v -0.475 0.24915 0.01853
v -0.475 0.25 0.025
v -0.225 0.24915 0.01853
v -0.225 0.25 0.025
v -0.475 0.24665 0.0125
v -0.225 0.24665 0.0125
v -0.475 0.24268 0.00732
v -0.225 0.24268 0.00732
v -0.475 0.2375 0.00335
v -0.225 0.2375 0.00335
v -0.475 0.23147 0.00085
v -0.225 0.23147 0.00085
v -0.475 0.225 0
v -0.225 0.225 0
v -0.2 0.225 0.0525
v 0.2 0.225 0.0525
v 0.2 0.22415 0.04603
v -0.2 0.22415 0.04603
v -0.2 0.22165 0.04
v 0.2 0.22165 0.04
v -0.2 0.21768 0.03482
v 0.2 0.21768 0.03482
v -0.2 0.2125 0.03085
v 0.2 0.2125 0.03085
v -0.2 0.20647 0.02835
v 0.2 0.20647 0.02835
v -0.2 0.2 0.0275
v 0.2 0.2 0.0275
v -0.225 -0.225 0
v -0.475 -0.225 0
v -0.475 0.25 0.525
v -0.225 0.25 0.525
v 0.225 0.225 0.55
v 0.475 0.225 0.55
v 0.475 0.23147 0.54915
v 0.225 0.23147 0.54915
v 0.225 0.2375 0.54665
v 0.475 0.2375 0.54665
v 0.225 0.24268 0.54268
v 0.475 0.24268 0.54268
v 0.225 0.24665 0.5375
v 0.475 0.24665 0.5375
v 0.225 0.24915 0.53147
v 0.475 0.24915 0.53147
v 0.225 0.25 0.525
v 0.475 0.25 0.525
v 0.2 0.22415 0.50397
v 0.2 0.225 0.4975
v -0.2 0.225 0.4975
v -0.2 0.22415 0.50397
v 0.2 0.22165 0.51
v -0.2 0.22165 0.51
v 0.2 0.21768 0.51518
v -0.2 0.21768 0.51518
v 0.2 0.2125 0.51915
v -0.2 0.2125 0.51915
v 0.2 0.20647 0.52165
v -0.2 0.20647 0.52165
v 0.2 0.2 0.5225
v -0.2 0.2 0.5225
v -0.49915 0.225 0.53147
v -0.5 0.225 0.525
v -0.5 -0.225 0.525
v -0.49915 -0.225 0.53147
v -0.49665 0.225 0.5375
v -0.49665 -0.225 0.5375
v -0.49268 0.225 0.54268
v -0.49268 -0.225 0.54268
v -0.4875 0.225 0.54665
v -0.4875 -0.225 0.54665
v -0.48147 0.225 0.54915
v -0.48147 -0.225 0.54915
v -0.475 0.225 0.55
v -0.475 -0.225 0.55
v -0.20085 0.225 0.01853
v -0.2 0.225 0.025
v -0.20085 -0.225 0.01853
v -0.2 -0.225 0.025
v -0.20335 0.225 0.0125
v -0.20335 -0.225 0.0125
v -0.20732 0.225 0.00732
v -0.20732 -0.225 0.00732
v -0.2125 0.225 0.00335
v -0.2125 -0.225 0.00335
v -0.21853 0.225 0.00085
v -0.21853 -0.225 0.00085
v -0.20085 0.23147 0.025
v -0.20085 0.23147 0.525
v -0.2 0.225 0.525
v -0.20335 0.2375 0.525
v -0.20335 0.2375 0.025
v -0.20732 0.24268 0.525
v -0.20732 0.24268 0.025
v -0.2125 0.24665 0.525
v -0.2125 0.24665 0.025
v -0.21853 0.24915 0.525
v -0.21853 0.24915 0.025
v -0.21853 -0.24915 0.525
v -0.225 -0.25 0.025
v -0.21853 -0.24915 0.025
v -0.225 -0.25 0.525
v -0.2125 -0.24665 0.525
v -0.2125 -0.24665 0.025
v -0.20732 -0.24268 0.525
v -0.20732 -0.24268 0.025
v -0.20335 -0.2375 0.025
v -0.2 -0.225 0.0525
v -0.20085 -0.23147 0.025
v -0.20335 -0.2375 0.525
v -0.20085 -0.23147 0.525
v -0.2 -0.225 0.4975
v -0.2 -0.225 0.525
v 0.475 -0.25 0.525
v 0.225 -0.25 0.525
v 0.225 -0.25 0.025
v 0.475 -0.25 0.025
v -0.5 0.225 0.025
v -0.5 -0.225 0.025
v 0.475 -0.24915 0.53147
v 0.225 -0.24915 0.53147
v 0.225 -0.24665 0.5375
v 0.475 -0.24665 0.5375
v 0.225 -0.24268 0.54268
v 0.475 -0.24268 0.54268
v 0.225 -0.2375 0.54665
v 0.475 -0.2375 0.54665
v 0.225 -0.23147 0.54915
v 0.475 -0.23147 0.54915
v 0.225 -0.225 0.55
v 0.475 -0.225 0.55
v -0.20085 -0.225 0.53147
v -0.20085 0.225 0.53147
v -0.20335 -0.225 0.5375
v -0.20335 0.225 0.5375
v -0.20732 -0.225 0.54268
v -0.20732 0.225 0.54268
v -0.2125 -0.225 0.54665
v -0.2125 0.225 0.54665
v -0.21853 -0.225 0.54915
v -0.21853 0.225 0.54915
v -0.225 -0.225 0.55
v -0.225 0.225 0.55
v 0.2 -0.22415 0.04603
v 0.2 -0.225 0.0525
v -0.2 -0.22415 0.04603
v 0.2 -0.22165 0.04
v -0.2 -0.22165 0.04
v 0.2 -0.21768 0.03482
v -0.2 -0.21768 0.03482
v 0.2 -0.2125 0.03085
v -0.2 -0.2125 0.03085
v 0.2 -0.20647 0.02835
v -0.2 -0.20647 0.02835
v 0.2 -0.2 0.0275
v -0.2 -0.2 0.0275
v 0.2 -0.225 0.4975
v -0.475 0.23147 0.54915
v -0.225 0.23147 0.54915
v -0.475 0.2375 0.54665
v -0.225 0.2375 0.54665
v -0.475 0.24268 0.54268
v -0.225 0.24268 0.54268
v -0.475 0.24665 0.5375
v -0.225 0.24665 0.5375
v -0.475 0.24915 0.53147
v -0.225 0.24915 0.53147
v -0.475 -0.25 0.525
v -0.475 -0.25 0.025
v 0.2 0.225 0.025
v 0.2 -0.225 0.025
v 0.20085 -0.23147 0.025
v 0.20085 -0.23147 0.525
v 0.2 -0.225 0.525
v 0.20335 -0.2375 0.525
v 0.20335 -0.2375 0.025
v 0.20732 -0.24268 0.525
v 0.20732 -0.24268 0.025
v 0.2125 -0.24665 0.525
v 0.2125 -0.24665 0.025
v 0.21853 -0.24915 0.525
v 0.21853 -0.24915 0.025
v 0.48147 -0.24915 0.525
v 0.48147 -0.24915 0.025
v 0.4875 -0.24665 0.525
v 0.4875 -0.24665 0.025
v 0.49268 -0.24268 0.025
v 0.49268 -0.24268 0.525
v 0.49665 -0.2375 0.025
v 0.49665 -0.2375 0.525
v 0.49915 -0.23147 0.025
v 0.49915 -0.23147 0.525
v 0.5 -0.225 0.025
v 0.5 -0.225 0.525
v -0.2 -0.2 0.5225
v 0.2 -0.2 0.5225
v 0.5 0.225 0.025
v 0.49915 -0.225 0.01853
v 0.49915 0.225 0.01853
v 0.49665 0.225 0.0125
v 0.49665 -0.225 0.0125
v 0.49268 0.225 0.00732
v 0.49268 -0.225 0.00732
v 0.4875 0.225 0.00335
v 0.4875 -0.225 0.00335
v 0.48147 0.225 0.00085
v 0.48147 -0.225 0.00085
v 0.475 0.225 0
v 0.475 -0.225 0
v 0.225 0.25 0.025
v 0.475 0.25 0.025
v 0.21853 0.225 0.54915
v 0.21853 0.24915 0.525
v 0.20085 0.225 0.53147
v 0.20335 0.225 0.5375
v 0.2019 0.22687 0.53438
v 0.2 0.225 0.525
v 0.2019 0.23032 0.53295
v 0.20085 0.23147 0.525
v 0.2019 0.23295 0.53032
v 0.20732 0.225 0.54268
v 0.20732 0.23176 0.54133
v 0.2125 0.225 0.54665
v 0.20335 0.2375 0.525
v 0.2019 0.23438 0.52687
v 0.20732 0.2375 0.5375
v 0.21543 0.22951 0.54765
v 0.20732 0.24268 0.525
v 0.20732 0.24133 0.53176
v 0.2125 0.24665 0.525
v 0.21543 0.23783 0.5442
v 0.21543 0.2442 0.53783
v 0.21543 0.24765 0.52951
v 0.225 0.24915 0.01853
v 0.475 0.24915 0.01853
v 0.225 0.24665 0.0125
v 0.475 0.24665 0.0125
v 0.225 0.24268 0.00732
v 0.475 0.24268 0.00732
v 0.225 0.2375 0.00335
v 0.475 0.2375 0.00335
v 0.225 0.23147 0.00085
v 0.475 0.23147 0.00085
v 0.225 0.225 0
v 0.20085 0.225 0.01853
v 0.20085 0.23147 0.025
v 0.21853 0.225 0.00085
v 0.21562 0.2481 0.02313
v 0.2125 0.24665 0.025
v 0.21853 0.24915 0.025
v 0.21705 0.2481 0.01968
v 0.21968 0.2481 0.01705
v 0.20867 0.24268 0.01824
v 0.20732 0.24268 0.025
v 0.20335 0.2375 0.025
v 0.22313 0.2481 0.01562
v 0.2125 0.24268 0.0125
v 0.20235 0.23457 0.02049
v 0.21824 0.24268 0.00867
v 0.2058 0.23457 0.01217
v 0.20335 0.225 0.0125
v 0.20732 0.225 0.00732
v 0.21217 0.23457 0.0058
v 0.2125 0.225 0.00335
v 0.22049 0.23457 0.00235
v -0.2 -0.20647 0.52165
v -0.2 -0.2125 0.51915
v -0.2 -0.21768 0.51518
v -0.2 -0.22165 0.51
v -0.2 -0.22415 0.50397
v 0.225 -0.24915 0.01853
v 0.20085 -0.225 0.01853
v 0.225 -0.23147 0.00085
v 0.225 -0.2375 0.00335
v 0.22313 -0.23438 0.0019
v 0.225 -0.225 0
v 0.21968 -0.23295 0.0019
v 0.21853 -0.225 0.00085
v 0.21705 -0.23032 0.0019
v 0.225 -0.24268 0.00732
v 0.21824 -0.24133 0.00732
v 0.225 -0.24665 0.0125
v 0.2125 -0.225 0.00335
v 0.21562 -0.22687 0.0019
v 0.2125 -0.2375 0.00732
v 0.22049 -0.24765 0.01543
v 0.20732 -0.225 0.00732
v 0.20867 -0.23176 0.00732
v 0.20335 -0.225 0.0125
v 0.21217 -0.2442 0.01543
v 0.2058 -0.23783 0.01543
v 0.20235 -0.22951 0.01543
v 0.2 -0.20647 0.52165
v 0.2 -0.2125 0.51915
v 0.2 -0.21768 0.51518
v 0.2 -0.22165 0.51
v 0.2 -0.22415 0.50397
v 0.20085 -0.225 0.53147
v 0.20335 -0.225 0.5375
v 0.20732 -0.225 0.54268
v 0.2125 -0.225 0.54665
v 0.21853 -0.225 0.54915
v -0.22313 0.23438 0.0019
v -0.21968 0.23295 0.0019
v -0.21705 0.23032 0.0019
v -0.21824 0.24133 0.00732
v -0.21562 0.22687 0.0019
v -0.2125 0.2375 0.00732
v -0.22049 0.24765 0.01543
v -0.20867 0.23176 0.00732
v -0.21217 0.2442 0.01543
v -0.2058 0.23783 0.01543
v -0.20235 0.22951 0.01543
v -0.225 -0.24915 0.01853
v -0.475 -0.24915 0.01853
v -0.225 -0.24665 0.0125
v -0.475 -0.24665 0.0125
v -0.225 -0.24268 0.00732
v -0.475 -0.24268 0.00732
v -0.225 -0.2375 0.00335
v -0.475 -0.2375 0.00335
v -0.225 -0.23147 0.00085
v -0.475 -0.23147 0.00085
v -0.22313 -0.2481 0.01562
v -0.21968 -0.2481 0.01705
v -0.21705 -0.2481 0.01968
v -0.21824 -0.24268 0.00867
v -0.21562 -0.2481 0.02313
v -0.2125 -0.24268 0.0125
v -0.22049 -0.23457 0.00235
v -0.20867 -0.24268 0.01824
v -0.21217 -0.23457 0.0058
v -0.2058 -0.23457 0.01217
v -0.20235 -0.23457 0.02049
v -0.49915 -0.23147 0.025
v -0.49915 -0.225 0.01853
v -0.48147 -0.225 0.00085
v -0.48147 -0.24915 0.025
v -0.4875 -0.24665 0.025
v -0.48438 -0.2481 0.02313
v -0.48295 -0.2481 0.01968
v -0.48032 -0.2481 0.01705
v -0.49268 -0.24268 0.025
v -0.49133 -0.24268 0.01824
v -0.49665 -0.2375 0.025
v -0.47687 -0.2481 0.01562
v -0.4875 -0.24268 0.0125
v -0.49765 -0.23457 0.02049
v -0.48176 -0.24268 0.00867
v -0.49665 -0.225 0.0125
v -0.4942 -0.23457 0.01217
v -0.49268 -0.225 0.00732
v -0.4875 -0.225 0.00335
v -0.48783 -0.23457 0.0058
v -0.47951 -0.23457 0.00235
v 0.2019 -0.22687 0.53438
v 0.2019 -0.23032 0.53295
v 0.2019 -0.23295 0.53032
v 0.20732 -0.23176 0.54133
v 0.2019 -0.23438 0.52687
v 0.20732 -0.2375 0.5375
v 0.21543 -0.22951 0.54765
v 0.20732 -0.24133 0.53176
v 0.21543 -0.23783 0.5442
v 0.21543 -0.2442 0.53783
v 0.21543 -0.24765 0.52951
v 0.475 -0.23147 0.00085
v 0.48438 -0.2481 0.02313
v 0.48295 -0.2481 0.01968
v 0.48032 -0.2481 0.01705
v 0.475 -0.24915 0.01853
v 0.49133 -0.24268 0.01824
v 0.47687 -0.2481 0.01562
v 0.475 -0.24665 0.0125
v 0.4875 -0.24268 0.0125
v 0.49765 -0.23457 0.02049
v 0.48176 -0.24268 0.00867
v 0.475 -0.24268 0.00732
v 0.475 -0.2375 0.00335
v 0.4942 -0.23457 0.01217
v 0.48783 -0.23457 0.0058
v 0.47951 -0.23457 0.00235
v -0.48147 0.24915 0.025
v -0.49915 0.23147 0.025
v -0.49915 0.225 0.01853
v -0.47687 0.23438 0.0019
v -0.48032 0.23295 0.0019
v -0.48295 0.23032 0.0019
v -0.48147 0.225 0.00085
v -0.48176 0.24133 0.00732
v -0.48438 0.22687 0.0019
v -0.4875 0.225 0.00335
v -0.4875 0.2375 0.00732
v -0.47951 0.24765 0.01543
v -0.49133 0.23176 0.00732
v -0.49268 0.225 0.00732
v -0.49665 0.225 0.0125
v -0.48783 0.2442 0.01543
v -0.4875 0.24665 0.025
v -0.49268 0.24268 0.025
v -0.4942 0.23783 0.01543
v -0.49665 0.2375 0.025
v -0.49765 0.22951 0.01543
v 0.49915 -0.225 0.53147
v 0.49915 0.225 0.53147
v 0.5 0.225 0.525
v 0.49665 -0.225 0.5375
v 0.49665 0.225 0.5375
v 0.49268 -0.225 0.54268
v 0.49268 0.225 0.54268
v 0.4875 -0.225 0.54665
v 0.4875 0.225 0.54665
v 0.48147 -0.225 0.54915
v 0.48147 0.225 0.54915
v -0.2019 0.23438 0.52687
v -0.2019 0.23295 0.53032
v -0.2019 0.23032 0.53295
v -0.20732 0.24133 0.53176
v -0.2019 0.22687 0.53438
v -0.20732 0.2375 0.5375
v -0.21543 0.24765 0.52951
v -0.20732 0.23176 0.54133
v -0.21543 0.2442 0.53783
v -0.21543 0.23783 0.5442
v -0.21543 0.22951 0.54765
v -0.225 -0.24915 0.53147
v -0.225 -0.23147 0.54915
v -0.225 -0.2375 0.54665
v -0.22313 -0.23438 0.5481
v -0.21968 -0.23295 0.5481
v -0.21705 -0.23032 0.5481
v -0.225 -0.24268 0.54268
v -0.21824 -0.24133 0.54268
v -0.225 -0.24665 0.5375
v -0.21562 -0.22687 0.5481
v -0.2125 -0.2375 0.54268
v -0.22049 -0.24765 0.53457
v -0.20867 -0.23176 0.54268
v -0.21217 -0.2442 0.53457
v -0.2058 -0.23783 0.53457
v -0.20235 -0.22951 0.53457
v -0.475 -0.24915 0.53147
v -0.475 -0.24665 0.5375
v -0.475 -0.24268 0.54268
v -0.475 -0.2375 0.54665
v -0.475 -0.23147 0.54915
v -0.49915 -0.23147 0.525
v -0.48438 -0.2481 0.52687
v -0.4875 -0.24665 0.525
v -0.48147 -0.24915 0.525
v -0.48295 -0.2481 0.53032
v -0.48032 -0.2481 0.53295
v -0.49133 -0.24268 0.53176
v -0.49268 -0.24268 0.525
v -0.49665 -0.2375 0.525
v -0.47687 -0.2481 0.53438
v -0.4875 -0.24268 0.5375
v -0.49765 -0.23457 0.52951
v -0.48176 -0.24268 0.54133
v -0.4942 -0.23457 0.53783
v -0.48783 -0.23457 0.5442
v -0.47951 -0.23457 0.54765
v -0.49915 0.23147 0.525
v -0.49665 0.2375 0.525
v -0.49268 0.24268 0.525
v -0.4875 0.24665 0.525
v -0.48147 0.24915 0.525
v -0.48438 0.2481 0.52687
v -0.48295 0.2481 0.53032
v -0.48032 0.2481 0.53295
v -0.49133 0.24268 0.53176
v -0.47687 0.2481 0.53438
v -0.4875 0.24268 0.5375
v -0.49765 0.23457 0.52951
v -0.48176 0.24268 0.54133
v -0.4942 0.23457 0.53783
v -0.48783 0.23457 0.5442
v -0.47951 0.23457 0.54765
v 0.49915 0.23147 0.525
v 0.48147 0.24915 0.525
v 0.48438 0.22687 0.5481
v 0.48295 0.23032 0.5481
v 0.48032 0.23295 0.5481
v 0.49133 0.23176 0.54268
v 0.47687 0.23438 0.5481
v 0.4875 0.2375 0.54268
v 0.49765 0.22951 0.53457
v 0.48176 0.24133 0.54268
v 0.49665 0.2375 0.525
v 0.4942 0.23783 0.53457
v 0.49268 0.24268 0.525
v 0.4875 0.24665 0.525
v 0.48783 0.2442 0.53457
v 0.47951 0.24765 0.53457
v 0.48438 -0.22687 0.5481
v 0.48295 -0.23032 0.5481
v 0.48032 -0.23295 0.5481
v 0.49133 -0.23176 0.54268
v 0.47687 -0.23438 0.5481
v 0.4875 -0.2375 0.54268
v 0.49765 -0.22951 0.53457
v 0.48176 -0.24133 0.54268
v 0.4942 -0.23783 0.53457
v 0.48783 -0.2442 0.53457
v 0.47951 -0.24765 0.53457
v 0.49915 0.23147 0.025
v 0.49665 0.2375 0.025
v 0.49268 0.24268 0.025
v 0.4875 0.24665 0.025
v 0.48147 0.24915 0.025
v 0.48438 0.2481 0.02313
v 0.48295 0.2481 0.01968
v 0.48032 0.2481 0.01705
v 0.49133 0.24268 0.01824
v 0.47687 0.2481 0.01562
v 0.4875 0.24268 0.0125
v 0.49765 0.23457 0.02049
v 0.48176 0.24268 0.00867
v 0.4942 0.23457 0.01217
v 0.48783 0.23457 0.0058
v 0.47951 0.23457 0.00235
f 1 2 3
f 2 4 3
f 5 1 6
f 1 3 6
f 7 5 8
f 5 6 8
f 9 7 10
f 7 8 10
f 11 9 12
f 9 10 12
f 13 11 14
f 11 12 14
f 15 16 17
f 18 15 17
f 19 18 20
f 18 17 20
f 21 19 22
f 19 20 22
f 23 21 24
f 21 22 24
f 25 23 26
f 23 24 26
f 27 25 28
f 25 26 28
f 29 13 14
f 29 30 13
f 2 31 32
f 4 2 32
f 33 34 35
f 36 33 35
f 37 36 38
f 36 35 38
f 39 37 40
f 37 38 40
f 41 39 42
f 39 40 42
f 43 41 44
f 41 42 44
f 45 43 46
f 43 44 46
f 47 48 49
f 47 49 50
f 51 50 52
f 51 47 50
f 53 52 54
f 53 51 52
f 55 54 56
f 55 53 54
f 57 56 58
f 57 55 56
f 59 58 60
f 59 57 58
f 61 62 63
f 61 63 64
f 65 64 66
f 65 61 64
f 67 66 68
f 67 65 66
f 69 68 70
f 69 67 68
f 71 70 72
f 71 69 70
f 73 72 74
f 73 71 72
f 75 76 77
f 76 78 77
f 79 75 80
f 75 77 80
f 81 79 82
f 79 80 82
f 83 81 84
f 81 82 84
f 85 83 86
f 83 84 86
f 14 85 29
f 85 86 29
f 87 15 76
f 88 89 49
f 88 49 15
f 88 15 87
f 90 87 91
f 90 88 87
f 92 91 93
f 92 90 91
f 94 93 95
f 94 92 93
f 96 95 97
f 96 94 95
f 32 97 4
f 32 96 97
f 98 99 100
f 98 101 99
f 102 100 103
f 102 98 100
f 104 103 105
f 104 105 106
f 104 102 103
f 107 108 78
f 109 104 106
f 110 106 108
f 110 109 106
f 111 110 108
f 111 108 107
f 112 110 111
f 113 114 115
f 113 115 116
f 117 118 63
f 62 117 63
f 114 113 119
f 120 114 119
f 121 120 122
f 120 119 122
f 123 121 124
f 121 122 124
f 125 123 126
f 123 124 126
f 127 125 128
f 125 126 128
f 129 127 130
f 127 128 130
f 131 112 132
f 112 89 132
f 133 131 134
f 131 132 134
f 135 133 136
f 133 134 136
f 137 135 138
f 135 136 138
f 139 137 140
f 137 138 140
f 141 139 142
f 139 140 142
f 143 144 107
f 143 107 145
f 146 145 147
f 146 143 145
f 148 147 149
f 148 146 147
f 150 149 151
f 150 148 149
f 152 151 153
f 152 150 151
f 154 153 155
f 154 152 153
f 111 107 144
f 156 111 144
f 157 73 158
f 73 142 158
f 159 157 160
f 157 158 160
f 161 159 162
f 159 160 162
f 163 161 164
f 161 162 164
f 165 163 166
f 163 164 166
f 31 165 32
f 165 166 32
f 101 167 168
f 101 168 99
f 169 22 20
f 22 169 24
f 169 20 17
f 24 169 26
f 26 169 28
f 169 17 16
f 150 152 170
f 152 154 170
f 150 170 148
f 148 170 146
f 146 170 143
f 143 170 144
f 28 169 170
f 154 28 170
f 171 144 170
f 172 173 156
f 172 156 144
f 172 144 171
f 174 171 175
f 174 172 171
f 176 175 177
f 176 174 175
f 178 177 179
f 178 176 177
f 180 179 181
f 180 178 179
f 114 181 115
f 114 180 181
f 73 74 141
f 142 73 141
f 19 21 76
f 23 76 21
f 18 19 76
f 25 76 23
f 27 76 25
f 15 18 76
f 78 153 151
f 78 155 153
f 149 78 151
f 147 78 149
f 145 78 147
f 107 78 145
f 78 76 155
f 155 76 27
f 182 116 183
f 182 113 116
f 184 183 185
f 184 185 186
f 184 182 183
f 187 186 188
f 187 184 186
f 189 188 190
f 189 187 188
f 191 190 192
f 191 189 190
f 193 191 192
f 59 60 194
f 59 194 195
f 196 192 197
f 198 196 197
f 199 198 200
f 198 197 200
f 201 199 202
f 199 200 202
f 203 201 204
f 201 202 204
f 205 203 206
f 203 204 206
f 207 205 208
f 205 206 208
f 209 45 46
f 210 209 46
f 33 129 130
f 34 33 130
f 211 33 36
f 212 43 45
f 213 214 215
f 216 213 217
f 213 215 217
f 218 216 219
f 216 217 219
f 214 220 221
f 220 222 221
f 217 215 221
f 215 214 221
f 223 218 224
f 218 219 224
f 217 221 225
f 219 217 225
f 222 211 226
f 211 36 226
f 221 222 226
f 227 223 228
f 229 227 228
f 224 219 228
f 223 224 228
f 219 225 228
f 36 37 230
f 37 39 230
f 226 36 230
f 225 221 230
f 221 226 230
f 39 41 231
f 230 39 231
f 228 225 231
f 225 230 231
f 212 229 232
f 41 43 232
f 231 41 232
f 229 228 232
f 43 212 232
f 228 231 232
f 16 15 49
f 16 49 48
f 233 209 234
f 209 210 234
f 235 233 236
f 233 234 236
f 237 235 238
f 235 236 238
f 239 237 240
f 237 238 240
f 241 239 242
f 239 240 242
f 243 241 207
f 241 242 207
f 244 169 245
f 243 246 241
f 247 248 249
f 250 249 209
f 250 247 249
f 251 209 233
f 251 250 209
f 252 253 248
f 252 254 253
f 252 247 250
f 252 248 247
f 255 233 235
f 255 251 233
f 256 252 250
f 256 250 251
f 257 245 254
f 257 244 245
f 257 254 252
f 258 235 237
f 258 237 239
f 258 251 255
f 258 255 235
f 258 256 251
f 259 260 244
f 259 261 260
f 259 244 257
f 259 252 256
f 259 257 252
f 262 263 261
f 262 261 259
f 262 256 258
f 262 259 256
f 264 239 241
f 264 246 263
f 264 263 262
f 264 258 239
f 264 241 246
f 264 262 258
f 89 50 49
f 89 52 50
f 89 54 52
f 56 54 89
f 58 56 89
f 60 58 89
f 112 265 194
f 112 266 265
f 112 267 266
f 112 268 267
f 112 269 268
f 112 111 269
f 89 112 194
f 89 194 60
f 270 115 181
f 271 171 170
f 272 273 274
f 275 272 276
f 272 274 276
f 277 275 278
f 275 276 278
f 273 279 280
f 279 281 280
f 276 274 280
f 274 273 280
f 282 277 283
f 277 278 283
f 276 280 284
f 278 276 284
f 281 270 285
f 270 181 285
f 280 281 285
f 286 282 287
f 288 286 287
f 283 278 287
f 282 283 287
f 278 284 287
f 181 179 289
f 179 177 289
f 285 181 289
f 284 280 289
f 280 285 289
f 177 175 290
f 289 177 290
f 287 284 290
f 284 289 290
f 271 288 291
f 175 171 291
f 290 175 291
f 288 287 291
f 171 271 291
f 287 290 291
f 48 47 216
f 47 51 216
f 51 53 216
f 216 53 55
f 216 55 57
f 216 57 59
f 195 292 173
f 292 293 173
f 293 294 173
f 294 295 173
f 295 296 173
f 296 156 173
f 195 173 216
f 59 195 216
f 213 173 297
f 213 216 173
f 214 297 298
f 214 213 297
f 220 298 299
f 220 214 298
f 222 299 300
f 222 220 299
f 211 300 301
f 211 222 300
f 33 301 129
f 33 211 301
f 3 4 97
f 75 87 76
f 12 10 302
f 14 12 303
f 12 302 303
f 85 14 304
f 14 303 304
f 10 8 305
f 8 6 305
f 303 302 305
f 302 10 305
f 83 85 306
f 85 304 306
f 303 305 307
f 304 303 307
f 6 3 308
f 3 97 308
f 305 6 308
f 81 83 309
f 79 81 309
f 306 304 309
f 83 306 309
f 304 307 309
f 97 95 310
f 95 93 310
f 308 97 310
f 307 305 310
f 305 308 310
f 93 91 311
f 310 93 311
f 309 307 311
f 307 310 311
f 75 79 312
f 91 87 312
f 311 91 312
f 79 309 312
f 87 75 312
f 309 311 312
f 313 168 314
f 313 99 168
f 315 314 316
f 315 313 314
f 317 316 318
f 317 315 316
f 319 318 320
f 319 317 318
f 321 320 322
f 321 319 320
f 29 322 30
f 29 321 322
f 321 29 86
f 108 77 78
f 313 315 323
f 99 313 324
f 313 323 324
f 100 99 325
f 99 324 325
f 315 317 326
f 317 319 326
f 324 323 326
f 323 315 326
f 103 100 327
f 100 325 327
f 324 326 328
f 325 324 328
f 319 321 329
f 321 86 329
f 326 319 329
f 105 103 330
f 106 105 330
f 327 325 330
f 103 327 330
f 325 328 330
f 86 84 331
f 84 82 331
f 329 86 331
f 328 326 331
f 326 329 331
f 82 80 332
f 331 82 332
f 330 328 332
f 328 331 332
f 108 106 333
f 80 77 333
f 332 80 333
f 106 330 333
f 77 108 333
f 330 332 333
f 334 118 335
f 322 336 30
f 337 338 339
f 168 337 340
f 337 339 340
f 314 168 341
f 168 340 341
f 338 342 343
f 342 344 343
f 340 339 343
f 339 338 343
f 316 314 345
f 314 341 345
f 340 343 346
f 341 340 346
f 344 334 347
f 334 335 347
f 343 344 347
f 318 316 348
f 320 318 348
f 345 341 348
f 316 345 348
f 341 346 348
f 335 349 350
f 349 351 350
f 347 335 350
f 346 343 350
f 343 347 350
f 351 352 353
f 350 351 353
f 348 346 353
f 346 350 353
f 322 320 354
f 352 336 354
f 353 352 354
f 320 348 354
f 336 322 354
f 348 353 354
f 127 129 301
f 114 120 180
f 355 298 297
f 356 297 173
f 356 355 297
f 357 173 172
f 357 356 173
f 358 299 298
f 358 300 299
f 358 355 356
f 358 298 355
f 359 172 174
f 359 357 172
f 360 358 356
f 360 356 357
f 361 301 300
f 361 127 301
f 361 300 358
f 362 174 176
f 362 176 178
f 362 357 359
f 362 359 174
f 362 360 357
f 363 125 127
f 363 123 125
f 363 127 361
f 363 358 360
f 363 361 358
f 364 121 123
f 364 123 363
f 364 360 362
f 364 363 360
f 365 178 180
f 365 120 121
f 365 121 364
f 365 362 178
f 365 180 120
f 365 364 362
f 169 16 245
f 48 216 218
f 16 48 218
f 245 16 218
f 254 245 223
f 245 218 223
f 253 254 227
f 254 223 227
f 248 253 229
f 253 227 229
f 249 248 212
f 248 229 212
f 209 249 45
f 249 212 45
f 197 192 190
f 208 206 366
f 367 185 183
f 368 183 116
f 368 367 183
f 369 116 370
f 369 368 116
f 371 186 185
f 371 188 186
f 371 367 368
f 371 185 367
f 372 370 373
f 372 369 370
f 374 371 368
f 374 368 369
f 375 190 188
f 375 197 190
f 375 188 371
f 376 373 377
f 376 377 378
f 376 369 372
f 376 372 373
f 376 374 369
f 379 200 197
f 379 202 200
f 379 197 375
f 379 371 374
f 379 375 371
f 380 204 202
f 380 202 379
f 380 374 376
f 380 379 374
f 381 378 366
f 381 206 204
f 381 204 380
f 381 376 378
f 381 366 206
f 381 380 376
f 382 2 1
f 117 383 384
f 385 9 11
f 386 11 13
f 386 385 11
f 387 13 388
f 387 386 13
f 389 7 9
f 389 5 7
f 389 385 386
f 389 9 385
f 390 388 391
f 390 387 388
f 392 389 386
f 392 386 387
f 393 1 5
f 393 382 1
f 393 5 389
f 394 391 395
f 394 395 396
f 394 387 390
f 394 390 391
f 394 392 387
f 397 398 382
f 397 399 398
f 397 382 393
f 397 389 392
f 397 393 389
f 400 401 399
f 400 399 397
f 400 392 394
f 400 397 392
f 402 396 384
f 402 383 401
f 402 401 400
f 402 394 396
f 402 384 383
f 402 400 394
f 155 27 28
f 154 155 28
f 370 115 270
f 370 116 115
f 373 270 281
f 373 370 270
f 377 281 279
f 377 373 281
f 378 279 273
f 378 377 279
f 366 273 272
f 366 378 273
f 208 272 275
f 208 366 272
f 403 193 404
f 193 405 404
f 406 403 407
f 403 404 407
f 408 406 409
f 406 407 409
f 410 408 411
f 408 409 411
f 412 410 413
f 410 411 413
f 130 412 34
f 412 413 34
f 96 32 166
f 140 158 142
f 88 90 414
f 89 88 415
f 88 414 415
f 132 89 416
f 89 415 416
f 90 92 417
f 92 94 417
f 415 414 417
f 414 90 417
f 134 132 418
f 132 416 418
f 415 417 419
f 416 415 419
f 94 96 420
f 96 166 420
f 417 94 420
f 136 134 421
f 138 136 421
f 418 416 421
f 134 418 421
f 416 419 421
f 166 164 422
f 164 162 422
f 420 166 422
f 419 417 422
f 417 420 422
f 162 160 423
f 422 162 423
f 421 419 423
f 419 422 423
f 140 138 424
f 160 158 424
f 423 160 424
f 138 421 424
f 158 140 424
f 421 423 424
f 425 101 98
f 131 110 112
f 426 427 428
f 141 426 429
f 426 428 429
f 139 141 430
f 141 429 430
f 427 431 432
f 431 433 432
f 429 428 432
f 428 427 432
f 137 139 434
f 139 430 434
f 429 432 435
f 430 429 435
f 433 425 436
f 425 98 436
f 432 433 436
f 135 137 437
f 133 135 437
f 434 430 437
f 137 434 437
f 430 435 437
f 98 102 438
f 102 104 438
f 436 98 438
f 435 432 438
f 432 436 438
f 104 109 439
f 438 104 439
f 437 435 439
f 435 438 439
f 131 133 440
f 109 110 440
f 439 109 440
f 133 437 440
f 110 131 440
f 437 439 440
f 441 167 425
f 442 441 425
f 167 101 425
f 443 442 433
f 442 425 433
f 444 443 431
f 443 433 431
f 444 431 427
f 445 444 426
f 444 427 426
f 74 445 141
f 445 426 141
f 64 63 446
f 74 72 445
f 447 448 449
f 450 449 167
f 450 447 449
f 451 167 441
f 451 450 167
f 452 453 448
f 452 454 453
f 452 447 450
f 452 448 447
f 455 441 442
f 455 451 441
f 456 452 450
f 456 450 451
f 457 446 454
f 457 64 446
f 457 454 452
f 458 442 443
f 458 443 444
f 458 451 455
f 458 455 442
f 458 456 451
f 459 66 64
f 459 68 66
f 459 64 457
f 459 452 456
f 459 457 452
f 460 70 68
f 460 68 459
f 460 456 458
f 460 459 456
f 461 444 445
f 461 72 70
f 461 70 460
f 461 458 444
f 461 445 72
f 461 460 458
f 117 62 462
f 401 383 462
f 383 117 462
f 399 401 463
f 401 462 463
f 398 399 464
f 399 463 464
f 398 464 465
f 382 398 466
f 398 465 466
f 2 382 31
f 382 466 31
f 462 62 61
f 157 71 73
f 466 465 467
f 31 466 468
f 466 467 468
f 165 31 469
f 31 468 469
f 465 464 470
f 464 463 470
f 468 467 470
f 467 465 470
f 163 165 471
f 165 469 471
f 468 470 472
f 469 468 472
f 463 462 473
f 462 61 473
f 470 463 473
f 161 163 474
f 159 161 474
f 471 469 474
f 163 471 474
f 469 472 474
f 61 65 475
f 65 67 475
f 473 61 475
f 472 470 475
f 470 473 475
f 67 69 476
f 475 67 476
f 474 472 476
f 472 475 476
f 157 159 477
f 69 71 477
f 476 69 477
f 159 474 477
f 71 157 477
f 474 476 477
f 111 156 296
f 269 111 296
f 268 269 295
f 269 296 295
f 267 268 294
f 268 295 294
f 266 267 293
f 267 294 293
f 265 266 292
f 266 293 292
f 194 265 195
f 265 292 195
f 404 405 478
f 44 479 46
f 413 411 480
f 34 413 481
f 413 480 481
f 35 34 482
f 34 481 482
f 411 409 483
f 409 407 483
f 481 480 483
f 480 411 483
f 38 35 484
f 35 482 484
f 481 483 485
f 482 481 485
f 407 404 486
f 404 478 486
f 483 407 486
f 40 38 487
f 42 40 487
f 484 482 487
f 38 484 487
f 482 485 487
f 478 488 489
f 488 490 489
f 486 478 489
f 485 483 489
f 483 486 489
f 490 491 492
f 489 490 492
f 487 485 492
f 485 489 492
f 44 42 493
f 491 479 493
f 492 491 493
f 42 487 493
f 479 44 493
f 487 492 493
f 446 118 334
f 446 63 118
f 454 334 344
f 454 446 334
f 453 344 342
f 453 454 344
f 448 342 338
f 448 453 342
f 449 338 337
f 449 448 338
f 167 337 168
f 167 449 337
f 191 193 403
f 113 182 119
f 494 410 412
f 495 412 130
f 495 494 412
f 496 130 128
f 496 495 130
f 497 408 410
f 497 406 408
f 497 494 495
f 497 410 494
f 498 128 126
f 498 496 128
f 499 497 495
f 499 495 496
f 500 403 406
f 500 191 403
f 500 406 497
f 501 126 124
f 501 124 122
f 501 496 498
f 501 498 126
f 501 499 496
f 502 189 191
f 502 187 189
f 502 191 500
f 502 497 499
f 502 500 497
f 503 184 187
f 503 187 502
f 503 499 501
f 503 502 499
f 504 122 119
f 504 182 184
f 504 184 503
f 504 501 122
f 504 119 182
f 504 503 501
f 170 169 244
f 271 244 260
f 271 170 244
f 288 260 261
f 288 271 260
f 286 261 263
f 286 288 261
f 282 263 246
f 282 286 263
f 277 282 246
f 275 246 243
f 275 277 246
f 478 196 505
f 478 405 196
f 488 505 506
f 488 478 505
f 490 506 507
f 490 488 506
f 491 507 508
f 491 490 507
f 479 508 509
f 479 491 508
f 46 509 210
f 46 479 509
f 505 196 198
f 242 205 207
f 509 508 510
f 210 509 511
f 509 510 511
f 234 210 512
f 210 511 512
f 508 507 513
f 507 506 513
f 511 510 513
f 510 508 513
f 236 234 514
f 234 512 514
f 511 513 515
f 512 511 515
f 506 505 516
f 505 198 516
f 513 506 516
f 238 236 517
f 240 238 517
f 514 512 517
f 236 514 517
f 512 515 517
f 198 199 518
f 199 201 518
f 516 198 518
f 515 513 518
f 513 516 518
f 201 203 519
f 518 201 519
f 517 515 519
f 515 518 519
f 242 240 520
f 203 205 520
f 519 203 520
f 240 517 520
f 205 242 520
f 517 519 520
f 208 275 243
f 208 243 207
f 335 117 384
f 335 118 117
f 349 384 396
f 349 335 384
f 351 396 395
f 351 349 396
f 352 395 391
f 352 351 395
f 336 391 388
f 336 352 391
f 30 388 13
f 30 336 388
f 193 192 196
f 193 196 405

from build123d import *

# Parameters (mm, degrees)
SKETCH002_W  = 0.3
SKETCH002_H  = 0.55
PAD002_DEPTH = 0.25
FILLET001_R  = 0.025
SKETCH001_W  = 0.3
SKETCH001_H  = 0.55
PAD001_DEPTH = 0.25
FILLET_R     = 0.025
SKETCH_W     = 0.9
SKETCH_H     = 0.45
PAD_DEPTH    = 0.495
FILLET002_R  = 0.025


with BuildPart() as body002:
    # Sketch002 → Pad002 (new body, symmetric)
    with BuildSketch(Plane.XZ):
        with Locations((0.35, 0.275)):
            Rectangle(SKETCH002_W, SKETCH002_H)
    extrude(amount=PAD002_DEPTH, both=True)

    # Fillet001
    fillet001_edges = [body002.edges().sort_by_distance(p)[0] for p in [
        (0.5, 0, 0),
        (0.5, 0.25, 0.275),
        (0.5, -0.25, 0.275),
        (0.5, 0, 0.55),
        (0.35, -0.25, 0.55),
        (0.35, 0.25, 0.55),
        (0.2, 0, 0.55),
        (0.2, -0.25, 0.275),
        (0.35, -0.25, 0),
        (0.2, 0, 0),
        (0.2, 0.25, 0.275),
        (0.35, 0.25, 0),
    ]]
    fillet(fillet001_edges, radius=FILLET001_R)


with BuildPart() as body001:
    # Sketch001 → Pad001 (new body, symmetric)
    with BuildSketch(Plane.XZ):
        with Locations((-0.35, 0.275)):
            Rectangle(SKETCH001_W, SKETCH001_H)
    extrude(amount=PAD001_DEPTH, both=True)

    # Fillet
    fillet_edges = [body001.edges().sort_by_distance(p)[0] for p in [
        (-0.5, 0, 0.55),
        (-0.5, 0.25, 0.275),
        (-0.35, 0.25, 0.55),
        (-0.2, 0.25, 0.275),
        (-0.35, 0.25, 0),
        (-0.2, 0, 0),
        (-0.5, 0, 0),
        (-0.5, -0.25, 0.275),
        (-0.35, -0.25, 0),
        (-0.2, -0.25, 0.275),
        (-0.35, -0.25, 0.55),
        (-0.2, 0, 0.55),
    ]]
    fillet(fillet_edges, radius=FILLET_R)


with BuildPart() as fusion:
    # Sketch → Pad (new body)
    with BuildSketch(Plane.XY.offset(0.0275)):
        Rectangle(SKETCH_W, SKETCH_H)
    extrude(amount=PAD_DEPTH)

    # Fillet002
    fillet002_edges = [fusion.edges().sort_by_distance(p)[0] for p in [
        (0, -0.225, 0.5225),
        (0, 0.225, 0.5225),
        (0, -0.225, 0.0275),
        (0, 0.225, 0.0275),
    ]]
    fillet(fillet002_edges, radius=FILLET002_R)

    # Fusion: union Body002, Body001
    add(body002.part)
    add(body001.part)


solid = fusion.part
